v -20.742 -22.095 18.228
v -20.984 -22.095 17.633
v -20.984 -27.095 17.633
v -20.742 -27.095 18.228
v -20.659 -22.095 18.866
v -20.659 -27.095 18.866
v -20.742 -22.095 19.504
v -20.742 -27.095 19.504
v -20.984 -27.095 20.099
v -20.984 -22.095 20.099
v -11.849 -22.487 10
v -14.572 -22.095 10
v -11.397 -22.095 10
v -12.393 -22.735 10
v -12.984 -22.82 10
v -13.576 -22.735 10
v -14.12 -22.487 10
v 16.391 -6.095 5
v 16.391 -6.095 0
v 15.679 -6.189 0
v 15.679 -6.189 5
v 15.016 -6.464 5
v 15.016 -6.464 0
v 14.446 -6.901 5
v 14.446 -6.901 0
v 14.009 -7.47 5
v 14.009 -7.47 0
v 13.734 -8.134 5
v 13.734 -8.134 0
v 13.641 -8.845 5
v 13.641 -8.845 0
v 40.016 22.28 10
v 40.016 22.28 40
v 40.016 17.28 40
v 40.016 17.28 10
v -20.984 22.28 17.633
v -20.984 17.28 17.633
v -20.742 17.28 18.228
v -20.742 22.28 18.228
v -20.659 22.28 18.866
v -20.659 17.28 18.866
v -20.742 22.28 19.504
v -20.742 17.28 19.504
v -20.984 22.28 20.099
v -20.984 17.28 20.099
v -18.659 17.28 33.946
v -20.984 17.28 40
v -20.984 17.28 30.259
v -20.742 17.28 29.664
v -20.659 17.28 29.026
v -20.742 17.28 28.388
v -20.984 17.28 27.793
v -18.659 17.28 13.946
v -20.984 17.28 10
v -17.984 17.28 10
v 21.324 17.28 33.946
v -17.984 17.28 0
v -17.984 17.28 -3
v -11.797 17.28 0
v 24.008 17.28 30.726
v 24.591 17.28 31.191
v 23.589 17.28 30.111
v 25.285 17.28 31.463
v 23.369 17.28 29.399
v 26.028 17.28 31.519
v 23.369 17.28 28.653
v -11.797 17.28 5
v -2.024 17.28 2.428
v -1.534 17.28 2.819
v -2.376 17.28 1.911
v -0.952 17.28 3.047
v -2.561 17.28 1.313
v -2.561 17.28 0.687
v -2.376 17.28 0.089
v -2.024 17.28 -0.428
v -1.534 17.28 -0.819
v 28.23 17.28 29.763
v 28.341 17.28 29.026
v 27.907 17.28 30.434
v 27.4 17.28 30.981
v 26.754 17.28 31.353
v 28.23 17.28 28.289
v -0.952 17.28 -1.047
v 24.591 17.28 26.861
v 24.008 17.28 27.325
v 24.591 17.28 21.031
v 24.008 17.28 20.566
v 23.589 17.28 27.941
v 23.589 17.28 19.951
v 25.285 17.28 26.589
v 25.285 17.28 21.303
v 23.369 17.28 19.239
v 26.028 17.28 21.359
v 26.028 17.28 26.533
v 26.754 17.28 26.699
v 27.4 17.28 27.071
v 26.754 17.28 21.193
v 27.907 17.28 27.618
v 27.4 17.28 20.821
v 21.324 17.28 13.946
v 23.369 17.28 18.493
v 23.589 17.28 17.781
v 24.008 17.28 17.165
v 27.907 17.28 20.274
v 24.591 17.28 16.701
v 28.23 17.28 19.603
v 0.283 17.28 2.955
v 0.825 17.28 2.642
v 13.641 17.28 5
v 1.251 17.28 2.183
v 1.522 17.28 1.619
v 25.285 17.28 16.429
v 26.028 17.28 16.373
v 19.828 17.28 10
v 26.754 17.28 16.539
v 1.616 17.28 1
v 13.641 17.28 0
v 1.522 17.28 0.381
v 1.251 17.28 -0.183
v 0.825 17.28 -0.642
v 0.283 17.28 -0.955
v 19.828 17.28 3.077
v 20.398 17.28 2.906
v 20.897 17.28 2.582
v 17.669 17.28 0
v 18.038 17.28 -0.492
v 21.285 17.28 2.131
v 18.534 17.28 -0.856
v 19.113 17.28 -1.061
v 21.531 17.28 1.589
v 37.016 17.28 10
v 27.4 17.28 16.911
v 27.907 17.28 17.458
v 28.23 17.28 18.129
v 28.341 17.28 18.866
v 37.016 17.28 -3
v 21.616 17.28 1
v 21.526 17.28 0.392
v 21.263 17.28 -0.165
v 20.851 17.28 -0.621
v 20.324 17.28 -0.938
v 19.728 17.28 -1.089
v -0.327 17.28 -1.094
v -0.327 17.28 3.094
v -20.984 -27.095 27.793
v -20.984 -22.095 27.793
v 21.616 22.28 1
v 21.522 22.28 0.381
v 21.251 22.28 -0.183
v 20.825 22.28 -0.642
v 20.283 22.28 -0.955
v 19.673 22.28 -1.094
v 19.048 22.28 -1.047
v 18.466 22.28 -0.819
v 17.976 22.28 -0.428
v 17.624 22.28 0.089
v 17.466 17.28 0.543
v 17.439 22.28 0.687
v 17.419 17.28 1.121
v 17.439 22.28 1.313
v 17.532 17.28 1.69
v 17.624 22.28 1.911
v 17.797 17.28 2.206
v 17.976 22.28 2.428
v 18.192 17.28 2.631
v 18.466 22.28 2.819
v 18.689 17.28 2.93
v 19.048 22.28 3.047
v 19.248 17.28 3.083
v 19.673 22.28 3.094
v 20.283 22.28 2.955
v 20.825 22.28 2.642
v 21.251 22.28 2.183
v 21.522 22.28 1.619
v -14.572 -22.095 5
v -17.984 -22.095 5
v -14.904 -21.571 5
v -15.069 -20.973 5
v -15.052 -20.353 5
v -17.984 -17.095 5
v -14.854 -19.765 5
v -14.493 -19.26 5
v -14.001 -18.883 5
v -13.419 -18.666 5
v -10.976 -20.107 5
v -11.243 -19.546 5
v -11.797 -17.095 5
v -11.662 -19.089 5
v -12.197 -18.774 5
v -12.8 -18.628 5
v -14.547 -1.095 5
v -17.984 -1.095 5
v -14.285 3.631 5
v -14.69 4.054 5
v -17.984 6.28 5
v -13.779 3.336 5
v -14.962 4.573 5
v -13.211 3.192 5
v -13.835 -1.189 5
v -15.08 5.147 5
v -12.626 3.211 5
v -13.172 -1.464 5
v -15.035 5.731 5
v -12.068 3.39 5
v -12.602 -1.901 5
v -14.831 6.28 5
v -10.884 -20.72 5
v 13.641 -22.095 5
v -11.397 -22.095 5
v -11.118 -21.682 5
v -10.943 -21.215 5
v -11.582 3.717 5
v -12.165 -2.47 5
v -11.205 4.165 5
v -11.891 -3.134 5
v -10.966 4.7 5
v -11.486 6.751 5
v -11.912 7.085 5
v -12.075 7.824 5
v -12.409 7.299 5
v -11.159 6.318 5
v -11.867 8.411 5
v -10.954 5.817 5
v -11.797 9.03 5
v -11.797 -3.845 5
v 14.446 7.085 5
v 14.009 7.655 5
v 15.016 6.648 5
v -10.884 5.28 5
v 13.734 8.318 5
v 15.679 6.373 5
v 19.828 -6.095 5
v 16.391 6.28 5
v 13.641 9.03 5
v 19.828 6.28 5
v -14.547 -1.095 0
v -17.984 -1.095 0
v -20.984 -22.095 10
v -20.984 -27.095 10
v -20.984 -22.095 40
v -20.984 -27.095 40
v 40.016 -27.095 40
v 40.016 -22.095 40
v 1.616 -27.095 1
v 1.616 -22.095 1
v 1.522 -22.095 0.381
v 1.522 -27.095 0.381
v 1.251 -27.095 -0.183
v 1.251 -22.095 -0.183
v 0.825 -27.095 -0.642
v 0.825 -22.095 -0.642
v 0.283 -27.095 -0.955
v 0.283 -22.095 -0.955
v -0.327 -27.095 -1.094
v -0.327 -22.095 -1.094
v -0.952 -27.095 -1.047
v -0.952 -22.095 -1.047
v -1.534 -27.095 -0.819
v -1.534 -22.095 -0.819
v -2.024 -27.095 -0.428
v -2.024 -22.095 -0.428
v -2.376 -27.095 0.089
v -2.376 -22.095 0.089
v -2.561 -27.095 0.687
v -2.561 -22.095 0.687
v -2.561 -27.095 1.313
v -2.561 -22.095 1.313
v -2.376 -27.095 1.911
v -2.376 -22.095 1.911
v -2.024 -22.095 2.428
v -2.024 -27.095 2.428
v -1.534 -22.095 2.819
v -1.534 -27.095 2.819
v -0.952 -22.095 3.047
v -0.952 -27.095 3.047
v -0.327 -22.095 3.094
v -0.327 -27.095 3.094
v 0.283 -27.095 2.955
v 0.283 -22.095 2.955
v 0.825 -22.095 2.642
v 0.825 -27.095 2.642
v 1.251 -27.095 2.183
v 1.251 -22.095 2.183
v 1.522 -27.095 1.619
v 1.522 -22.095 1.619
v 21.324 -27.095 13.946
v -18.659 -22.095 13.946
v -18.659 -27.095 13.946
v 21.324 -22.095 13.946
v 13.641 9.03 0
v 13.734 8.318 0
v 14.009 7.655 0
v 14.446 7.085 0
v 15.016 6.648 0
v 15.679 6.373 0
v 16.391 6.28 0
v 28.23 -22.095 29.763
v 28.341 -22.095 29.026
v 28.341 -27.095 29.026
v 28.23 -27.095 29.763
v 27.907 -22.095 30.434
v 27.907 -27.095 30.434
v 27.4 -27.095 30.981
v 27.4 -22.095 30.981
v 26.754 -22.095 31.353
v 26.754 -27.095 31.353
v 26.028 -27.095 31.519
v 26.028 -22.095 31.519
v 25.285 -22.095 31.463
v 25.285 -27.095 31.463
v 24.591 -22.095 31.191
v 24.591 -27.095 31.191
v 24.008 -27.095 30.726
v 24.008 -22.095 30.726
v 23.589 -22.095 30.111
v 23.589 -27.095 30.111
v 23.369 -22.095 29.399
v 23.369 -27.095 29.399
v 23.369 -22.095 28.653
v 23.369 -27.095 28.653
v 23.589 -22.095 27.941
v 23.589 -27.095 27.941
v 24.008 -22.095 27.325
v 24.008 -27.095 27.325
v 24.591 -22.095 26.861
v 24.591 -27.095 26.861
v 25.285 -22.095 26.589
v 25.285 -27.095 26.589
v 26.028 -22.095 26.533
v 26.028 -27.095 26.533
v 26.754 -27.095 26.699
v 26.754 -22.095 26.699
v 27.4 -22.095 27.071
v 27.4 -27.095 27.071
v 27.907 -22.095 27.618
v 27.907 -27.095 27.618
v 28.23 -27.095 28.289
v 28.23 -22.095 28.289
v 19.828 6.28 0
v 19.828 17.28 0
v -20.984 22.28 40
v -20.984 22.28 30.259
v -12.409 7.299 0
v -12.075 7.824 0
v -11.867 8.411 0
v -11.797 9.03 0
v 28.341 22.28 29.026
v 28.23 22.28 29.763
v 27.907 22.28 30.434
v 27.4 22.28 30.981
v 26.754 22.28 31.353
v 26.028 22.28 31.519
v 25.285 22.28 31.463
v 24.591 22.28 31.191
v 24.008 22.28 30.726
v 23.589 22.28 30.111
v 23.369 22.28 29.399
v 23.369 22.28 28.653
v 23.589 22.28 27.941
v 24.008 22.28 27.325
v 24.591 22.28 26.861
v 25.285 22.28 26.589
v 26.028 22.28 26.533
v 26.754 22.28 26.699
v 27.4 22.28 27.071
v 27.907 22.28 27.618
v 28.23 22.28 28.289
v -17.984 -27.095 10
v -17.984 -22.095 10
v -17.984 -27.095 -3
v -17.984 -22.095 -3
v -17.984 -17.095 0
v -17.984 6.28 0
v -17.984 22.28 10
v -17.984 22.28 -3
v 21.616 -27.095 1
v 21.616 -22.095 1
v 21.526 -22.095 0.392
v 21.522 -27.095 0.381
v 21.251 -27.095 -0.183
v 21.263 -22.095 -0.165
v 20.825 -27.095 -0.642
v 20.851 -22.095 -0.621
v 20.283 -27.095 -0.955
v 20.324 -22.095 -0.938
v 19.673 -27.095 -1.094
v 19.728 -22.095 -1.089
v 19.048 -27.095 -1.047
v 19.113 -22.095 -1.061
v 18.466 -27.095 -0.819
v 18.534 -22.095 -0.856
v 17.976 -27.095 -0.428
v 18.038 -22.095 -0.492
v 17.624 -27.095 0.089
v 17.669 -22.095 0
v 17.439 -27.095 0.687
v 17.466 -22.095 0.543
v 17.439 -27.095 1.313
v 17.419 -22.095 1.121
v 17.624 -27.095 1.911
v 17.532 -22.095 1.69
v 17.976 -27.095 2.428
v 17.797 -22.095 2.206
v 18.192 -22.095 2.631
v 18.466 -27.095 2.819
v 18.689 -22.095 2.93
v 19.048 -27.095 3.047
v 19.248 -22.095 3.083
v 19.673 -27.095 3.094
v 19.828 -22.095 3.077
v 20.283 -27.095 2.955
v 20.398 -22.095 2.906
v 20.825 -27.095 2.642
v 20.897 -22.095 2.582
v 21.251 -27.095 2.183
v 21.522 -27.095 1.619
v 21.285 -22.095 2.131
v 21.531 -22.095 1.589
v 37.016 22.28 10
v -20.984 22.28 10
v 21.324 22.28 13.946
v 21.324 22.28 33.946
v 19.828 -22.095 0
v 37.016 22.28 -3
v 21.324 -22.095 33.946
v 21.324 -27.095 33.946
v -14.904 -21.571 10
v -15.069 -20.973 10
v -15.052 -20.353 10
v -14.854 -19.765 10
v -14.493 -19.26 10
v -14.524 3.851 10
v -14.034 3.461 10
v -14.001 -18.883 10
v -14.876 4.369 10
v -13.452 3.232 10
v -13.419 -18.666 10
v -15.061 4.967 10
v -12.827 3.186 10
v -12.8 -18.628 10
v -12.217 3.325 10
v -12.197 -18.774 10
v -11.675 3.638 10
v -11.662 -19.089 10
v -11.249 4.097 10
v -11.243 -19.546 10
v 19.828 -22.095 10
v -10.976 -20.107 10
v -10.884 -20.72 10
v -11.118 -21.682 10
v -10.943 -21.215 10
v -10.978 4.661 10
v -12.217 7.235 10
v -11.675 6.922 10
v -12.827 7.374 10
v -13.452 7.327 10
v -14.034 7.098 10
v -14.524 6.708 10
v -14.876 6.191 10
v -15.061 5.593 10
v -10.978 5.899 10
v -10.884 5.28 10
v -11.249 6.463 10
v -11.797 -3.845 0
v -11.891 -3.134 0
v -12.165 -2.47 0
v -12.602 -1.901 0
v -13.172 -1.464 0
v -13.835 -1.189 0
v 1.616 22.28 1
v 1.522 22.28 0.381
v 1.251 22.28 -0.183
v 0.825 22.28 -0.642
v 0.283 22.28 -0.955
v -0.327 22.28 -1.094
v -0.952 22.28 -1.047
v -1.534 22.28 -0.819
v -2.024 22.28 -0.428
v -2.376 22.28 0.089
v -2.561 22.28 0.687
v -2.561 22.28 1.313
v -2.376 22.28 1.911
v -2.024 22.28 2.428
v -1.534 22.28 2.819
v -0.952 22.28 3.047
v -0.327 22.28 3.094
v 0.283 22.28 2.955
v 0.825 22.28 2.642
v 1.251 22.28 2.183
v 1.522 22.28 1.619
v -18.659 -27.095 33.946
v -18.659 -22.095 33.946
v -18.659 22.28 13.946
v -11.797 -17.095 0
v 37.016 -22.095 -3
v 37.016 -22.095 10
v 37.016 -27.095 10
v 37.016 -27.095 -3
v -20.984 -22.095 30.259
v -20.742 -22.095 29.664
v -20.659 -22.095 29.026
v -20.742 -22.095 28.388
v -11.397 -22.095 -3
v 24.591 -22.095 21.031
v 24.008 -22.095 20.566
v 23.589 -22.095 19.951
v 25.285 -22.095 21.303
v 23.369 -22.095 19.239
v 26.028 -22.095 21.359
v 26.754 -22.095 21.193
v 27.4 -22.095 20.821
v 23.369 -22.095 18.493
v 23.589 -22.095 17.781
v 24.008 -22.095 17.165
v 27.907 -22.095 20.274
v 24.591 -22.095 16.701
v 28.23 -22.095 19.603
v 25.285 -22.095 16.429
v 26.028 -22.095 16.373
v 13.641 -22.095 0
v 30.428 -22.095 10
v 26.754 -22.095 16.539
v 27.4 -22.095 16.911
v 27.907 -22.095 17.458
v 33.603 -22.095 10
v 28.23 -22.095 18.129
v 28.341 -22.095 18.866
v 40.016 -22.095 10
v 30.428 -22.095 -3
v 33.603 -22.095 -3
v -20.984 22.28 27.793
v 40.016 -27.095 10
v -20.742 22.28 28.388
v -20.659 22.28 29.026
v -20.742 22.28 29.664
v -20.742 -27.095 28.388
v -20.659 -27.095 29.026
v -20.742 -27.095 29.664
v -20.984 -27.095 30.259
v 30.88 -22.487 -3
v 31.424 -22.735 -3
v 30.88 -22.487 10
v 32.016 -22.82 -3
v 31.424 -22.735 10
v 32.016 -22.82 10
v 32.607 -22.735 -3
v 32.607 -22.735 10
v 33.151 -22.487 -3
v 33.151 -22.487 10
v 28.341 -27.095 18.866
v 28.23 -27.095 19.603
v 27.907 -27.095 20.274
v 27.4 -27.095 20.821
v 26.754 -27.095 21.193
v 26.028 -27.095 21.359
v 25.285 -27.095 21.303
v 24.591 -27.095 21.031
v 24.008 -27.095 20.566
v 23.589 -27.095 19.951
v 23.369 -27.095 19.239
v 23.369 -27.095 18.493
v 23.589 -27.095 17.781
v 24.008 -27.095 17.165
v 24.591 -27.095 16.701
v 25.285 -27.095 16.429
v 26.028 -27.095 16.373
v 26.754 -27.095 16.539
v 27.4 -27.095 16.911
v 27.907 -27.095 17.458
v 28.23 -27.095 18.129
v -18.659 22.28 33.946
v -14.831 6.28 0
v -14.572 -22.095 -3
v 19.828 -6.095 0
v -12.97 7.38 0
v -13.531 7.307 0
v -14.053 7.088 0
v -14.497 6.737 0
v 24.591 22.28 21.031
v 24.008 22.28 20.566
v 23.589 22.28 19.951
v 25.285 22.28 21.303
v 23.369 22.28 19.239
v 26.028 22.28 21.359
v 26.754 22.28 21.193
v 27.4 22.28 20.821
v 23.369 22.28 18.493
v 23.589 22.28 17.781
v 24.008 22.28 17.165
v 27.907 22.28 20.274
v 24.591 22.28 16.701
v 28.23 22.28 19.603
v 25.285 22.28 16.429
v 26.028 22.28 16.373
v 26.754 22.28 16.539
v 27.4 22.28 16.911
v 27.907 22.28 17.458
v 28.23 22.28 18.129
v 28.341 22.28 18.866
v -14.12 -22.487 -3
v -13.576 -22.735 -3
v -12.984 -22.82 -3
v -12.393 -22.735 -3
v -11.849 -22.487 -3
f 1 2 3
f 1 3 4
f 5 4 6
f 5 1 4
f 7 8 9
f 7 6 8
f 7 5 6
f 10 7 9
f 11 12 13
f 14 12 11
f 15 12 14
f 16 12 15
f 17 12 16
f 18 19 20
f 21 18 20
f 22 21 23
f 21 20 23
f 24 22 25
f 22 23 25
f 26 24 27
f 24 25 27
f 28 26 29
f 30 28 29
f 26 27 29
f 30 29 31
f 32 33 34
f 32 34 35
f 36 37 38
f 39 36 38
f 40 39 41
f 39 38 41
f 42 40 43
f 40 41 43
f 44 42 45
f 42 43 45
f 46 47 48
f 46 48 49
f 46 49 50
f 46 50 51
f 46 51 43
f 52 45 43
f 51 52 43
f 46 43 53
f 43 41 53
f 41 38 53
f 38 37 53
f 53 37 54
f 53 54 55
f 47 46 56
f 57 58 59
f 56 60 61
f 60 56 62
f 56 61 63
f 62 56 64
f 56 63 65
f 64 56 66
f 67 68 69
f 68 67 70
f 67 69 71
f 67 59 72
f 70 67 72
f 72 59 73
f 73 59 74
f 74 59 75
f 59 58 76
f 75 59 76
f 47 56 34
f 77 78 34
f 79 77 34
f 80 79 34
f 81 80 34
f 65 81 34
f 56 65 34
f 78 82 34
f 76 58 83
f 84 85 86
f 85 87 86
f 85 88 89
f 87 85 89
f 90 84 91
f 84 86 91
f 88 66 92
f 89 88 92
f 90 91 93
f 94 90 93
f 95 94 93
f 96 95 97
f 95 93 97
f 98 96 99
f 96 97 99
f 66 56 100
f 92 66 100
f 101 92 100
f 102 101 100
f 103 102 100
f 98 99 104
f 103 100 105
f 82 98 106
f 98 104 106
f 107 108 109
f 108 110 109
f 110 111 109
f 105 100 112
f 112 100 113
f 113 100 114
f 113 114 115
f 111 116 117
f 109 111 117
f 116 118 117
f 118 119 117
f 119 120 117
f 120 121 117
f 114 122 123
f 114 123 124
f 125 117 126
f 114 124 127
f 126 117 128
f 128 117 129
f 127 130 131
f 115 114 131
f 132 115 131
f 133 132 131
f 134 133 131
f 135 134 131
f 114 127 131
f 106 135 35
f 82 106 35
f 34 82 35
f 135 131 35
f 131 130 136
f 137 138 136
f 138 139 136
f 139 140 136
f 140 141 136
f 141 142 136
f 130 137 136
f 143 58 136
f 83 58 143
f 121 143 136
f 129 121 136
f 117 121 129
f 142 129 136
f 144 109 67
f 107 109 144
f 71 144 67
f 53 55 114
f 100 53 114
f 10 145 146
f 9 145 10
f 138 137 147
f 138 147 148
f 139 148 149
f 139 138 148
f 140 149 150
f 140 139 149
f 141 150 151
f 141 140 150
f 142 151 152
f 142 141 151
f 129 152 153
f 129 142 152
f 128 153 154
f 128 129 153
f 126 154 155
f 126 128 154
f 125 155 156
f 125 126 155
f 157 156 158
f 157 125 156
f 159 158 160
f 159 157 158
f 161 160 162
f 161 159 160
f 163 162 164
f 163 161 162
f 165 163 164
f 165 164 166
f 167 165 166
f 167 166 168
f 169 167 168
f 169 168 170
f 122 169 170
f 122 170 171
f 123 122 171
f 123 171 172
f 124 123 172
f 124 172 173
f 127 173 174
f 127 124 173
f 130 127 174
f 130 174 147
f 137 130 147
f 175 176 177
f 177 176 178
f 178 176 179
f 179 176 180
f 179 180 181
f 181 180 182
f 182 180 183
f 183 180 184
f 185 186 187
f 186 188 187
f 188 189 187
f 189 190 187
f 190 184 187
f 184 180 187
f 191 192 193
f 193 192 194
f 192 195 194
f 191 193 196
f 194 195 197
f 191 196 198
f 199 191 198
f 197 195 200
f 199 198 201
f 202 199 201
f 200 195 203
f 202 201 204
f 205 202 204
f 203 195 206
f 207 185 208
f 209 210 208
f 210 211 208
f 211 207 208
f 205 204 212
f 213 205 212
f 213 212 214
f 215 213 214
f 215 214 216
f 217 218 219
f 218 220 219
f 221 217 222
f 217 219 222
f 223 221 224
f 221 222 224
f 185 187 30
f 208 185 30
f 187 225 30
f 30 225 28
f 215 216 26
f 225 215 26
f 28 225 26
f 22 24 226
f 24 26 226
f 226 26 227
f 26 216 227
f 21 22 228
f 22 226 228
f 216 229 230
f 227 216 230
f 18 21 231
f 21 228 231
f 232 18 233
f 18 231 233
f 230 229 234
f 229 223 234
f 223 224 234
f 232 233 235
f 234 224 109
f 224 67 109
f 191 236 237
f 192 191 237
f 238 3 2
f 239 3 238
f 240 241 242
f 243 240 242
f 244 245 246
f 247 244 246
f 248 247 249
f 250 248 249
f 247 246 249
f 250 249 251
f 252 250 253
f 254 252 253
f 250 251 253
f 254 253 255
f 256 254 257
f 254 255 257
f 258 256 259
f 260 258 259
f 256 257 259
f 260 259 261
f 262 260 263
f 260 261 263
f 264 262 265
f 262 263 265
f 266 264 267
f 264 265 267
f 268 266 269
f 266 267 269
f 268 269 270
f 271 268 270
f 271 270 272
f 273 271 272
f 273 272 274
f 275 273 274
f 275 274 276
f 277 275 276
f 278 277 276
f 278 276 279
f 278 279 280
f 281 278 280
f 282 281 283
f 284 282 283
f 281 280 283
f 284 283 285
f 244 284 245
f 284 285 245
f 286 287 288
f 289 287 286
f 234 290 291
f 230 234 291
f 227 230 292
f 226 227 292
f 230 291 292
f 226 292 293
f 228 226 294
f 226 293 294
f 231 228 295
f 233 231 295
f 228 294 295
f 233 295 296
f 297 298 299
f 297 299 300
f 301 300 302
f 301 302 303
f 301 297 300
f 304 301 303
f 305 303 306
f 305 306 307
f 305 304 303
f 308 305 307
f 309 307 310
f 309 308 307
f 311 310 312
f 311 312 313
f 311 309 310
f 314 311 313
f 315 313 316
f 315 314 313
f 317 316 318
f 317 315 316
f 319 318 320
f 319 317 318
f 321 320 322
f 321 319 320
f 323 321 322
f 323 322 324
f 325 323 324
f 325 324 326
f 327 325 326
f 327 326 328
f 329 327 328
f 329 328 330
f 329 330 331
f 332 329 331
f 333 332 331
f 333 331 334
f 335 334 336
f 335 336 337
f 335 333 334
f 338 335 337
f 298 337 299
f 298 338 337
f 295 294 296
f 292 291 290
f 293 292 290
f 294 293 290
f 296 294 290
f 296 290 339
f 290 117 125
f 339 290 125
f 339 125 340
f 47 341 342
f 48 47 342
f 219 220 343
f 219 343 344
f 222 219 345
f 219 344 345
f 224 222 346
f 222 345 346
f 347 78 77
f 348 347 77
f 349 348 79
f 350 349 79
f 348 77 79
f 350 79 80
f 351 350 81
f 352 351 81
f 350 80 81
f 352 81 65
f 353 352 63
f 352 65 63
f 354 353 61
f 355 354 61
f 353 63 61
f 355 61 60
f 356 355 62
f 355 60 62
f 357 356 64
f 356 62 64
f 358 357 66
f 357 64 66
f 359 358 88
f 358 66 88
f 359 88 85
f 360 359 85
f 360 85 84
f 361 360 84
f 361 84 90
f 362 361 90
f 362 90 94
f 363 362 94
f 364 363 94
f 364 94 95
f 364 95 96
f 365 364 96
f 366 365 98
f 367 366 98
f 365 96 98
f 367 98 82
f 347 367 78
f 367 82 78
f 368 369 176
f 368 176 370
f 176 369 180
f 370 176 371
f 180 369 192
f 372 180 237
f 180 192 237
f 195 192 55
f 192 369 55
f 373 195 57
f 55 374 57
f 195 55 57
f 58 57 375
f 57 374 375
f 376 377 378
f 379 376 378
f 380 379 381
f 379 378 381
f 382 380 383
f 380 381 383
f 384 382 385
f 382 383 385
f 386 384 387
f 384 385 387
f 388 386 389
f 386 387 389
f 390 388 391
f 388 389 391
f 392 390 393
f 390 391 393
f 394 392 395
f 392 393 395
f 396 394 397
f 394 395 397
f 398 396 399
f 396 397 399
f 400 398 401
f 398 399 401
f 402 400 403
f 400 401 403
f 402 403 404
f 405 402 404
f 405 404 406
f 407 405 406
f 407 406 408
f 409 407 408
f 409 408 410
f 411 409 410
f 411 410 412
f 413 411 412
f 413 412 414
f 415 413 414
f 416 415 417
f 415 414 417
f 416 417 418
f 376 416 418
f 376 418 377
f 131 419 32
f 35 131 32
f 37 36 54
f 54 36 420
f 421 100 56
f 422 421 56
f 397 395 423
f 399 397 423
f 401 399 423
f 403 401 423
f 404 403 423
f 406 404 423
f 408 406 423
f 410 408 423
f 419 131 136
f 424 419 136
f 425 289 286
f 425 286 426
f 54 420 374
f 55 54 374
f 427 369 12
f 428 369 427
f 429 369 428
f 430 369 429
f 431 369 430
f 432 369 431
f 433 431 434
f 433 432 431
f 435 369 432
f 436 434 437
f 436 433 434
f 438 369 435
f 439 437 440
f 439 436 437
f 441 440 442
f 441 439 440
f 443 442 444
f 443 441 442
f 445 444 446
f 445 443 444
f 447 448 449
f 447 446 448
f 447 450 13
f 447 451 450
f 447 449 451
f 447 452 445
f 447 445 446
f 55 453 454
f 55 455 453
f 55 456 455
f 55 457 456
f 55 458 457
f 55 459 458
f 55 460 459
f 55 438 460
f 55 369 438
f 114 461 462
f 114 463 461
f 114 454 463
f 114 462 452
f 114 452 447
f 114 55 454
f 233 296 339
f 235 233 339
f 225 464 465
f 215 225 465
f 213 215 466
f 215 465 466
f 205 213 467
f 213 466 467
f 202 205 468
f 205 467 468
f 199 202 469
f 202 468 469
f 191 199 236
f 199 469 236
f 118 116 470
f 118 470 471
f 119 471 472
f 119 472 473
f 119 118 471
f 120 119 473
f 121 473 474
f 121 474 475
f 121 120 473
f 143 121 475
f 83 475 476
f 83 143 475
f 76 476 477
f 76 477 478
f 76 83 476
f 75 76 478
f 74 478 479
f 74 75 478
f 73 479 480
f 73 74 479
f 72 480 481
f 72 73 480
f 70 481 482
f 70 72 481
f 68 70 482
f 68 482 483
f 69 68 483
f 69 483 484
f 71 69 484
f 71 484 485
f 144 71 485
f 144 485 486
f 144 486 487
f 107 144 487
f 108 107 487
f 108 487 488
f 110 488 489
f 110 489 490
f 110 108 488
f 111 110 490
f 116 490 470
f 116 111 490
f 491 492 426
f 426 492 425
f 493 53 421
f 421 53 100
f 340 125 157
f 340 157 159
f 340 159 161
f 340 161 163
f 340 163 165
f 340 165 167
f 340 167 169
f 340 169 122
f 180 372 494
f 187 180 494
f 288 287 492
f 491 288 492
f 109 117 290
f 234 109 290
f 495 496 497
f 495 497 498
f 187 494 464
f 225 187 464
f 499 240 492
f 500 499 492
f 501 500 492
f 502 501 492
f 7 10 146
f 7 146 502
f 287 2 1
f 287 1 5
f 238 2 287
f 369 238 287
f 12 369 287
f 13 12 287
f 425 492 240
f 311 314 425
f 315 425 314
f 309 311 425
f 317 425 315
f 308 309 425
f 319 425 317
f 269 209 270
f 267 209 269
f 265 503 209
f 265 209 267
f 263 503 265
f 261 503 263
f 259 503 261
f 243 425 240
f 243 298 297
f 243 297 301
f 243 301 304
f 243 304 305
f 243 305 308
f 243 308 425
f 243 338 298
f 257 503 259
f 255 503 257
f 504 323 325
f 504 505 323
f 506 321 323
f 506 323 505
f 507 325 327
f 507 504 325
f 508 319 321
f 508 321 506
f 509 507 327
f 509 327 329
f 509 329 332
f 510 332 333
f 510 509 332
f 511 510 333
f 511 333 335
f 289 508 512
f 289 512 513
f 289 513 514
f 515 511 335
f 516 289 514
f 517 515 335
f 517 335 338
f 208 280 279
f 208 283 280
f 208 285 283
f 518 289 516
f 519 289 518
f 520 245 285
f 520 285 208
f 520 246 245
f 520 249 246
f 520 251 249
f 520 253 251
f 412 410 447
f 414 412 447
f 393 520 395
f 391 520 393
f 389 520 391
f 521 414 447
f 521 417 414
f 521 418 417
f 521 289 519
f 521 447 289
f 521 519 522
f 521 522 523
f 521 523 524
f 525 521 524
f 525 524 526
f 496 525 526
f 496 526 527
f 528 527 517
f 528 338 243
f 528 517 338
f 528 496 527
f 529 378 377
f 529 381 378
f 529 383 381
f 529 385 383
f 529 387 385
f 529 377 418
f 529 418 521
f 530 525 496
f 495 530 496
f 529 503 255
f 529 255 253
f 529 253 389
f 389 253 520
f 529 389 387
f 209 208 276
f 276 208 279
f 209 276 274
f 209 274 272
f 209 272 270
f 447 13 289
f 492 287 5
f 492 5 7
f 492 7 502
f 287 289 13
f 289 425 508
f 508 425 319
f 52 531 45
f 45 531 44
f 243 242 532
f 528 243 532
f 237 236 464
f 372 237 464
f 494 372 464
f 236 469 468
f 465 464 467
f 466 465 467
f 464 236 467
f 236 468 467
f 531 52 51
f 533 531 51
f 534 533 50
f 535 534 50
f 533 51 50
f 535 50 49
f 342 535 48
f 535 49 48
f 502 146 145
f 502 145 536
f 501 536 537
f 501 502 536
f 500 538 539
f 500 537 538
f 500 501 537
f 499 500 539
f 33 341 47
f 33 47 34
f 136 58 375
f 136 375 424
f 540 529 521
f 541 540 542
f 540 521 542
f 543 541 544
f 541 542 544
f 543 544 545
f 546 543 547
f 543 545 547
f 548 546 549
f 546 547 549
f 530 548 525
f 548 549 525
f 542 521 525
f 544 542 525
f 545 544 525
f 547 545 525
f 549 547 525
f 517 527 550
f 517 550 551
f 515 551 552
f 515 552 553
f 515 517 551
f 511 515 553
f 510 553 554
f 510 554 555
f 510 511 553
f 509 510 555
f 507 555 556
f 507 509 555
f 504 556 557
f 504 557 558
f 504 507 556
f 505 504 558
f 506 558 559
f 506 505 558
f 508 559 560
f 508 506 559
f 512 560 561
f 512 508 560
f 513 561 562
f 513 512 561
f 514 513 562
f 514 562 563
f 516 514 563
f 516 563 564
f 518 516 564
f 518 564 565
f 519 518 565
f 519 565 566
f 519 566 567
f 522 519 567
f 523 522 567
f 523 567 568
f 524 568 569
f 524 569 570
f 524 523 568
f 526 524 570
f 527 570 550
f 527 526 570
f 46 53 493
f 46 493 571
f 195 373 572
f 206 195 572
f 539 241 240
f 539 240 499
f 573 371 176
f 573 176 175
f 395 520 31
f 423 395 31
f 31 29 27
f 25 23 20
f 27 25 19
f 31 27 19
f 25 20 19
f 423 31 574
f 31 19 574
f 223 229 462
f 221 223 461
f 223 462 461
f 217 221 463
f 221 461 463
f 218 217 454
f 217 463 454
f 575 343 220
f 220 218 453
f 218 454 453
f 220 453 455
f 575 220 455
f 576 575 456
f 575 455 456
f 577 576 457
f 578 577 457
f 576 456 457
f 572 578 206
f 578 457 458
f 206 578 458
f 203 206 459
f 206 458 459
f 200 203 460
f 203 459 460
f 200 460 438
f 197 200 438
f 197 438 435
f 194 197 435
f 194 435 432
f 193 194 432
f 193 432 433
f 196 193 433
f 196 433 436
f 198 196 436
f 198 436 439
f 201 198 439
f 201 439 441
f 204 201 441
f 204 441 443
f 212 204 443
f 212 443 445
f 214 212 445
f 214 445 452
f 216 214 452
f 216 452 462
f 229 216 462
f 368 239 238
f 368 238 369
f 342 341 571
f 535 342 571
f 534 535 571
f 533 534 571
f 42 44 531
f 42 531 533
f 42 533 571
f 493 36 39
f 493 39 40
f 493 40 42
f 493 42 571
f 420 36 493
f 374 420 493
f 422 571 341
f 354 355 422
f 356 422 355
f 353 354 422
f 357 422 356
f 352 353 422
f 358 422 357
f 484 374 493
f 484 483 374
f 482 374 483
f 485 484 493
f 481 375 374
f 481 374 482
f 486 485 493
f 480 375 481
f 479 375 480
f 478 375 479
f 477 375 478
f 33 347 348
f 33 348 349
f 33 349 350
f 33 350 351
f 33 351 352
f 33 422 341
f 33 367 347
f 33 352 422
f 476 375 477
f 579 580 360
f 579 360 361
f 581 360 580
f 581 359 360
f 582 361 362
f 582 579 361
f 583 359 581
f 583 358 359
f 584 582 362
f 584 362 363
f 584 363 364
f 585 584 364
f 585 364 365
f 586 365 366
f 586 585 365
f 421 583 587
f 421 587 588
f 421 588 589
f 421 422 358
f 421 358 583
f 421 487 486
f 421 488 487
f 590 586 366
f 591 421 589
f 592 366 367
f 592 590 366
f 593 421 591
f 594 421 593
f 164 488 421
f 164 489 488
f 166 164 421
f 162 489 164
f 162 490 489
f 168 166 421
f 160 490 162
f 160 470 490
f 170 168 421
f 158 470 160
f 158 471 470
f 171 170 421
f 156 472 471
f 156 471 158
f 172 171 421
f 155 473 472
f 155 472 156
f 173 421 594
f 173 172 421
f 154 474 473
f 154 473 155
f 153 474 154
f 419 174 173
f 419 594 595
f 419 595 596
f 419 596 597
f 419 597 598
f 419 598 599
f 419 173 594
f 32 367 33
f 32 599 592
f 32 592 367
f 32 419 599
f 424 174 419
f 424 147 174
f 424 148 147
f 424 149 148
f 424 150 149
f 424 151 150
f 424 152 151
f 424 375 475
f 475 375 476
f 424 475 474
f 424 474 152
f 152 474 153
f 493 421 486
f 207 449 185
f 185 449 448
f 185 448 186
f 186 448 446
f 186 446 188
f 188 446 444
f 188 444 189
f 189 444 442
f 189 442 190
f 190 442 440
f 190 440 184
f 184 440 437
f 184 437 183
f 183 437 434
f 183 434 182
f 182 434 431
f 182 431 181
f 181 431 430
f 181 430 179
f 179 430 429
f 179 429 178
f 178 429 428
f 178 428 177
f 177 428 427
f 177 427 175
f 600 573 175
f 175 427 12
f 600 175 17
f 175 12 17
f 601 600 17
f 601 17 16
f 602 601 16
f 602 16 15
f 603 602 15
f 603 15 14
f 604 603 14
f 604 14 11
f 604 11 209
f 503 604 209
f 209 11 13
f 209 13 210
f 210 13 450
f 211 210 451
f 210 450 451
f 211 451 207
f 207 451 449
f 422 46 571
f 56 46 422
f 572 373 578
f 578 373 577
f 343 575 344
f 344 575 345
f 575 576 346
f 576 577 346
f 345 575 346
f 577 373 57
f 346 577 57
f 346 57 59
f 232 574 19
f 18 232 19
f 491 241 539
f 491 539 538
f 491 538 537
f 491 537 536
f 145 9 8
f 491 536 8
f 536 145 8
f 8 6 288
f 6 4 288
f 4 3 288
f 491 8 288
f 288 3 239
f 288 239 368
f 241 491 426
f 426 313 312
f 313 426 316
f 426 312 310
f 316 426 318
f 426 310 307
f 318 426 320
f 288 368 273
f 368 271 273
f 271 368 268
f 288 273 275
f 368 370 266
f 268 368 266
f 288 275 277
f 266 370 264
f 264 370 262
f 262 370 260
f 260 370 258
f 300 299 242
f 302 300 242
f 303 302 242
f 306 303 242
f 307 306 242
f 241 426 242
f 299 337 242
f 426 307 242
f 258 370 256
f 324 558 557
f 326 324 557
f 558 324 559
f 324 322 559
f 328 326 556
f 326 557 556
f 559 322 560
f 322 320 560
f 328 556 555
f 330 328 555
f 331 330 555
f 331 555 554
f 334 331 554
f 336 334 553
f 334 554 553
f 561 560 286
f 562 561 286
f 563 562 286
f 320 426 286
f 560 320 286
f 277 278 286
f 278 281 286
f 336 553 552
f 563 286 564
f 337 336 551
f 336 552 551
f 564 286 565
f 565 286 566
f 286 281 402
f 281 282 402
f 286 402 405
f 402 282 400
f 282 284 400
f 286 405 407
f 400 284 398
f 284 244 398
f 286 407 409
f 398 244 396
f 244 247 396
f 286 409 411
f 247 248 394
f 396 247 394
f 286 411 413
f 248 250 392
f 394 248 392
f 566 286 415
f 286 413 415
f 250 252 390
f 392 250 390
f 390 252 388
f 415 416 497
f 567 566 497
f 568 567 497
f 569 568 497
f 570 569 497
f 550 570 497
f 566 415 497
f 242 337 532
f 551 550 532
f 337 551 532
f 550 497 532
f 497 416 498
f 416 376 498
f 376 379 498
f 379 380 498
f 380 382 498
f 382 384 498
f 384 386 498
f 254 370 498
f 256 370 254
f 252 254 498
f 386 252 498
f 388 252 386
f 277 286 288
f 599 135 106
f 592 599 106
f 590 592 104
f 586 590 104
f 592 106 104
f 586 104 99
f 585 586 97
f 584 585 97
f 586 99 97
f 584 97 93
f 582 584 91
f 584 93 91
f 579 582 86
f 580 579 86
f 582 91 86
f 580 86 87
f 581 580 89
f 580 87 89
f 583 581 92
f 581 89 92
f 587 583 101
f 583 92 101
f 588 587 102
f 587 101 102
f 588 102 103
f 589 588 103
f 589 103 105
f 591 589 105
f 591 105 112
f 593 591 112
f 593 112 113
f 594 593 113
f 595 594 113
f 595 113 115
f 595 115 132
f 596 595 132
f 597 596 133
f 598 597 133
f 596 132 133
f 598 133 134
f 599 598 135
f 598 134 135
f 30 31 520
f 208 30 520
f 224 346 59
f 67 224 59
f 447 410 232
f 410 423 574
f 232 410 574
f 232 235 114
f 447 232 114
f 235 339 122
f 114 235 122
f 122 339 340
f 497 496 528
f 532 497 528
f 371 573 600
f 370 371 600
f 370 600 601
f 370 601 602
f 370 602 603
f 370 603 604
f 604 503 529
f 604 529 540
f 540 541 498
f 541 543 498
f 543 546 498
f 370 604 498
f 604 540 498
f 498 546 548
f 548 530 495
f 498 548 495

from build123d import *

# Parameters (mm, degrees)
BOSS_EXTRUDE1_DEPTH   = 5
BOSS_EXTRUDE1_2_DEPTH = 5
BOSS_EXTRUDE1_3_DEPTH = 5
BOSS_EXTRUDE1_4_DEPTH = 5
SKETCH2_W             = 37.8125
SKETCH2_H             = 39.375
BOSS_EXTRUDE2_DEPTH   = 5
SKETCH3_W             = 55
SKETCH3_H             = 13
SKETCH3_R             = 2.1
BOSS_EXTRUDE3_DEPTH   = 5
SKETCH4_W             = 61
SKETCH4_H             = 30
BOSS_EXTRUDE4_DEPTH   = 5
SKETCH5_R             = 2.5
SKETCH5_W             = 39.983210939
SKETCH5_H             = 20
CUT_EXTRUDE3_DEPTH    = 5
SKETCH7_R             = 2.1
CUT_EXTRUDE4_DEPTH    = 14


with BuildPart() as part:
    # Sketch1 → Boss-Extrude1 (new body)
    with BuildSketch(Plane.XY):
        with BuildLine():
            Line((16.390676557, 6.279692656), (19.828176557, 6.279692656))
            Line((19.828176557, 6.279692656), (19.828176557, 17.279692656))
            Line((19.828176557, 17.279692656), (13.640676557, 17.279692656))
            Line((13.640676557, 17.279692656), (13.640676557, 9.029692656))
            ThreePointArc((13.640676557, 9.029692656), (14.446132909, 7.085149007), (16.390676557, 6.279692656))
        make_face()
    extrude(amount=BOSS_EXTRUDE1_DEPTH)



with BuildPart() as body_2:
    # Sketch1 → Boss-Extrude1 2 (new body)
    with BuildSketch(Plane.XY):
        with BuildLine():
            Line((-17.984323443, 6.279692656), (-14.546823443, 6.279692656))
            ThreePointArc((-14.546823443, 6.279692656), (-12.602279794, 7.085149007), (-11.796823443, 9.029692656))
            Line((-11.796823443, 9.029692656), (-11.796823443, 17.279692656))
            Line((-11.796823443, 17.279692656), (-17.984323443, 17.279692656))
            Line((-17.984323443, 17.279692656), (-17.984323443, 6.279692656))
        make_face()
    extrude(amount=BOSS_EXTRUDE1_2_DEPTH)


with BuildPart() as body_3:
    # Sketch1 → Boss-Extrude1 3 (new body)
    with BuildSketch(Plane.XY):
        with BuildLine():
            Line((19.828176557, -6.095307344), (16.390676557, -6.095307344))
            ThreePointArc((16.390676557, -6.095307344), (14.446132909, -6.900763696), (13.640676557, -8.845307344))
            Line((13.640676557, -8.845307344), (13.640676557, -22.095307344))
            Line((13.640676557, -22.095307344), (19.828176557, -22.095307344))
            Line((19.828176557, -22.095307344), (19.828176557, -6.095307344))
        make_face()
    extrude(amount=BOSS_EXTRUDE1_3_DEPTH)


with BuildPart() as body_4:
    # Sketch1 → Boss-Extrude1 4 (new body)
    with BuildSketch(Plane.XY):
        with BuildLine():
            Line((-11.796823443, -17.095307344), (-11.796823443, -3.845307344))
            ThreePointArc((-11.796823443, -3.845307344), (-12.602279794, -1.900763696), (-14.546823443, -1.095307344))
            Line((-14.546823443, -1.095307344), (-17.984323443, -1.095307344))
            Line((-17.984323443, -1.095307344), (-17.984323443, -17.095307344))
            Line((-17.984323443, -17.095307344), (-11.796823443, -17.095307344))
        make_face()
    extrude(amount=BOSS_EXTRUDE1_4_DEPTH)


with BuildPart() as part_1:
    add(part.part)

    add(body_2.part)  # Boss-Extrude2 merges body 2

    add(body_3.part)  # Boss-Extrude2 merges body 3

    add(body_4.part)  # Boss-Extrude2 merges body 4
    # Sketch2 → Boss-Extrude2 (add)
    with BuildSketch(Plane.XY.offset(5)):
        with Locations((0.921926557, -2.407807344)):
            Rectangle(SKETCH2_W, SKETCH2_H)
    extrude(amount=BOSS_EXTRUDE2_DEPTH)

    # Sketch3 → Boss-Extrude3 (add)
    with BuildSketch(Plane(origin=(0, 17.279692656, 0), x_dir=(1, 0, 0), z_dir=(0, 1, 0))):
        with Locations((9.515676557, -3.5)):
            Rectangle(SKETCH3_W, SKETCH3_H)
        with Locations((-0.484323443, -1)):
            Circle(SKETCH3_R, mode=Mode.SUBTRACT)
        with Locations((19.515676557, -1)):
            Circle(SKETCH3_R, mode=Mode.SUBTRACT)
    boss_extrude3 = extrude(amount=BOSS_EXTRUDE3_DEPTH)

    # Mirror1: Boss-Extrude3 across plane
    add(boss_extrude3.mirror(Plane(origin=(0, -2.407807344, 0), x_dir=(0, 0, 1), z_dir=(0, -1, 0))))

    # Sketch4 → Boss-Extrude4 (add)
    with BuildSketch(Plane(origin=(0, 22.279692656, 0), x_dir=(1, 0, 0), z_dir=(0, 1, 0))):
        with Locations((9.515676557, -25)):
            Rectangle(SKETCH4_W, SKETCH4_H)
    boss_extrude4 = extrude(amount=-BOSS_EXTRUDE4_DEPTH)

    # Mirror2: Boss-Extrude4 across plane
    add(boss_extrude4.mirror(Plane(origin=(0, -2.407807344, 0), x_dir=(0, 0, 1), z_dir=(0, -1, 0))))

    # Sketch5 → Cut-Extrude3 (cut)
    with BuildSketch(Plane.XZ.offset(-17.279692656)):
        with Locations((-23.159015917, 29.025922811)):
            Circle(SKETCH5_R)
        with Locations((-23.159015917, 18.865922811)):
            Circle(SKETCH5_R)
        with Locations((25.840984083, 29.025922811)):
            Circle(SKETCH5_R)
        with Locations((25.840984083, 18.865922811)):
            Circle(SKETCH5_R)
        with Locations((1.332589552, 23.945922811)):
            Rectangle(SKETCH5_W, SKETCH5_H)
    cut_extrude3 = extrude(amount=-CUT_EXTRUDE3_DEPTH, mode=Mode.SUBTRACT)

    # Sketch7 → Cut-Extrude4 (cut, through all)
    with BuildSketch(Plane.XY.offset(10)):
        with Locations((32.015676557, -20.720307344)):
            Circle(SKETCH7_R)
        with Locations((-12.984323443, -20.720307344)):
            Circle(SKETCH7_R)
        with Locations((32.015676557, 5.279692656)):
            Circle(SKETCH7_R)
        with Locations((-12.984323443, 5.279692656)):
            Circle(SKETCH7_R)
    extrude(amount=-CUT_EXTRUDE4_DEPTH, mode=Mode.SUBTRACT)

    # Mirror3: Cut-Extrude3 across plane
    add(cut_extrude3.mirror(Plane(origin=(0, -2.407807344, 0), x_dir=(0, 0, 1), z_dir=(0, -1, 0))), mode=Mode.SUBTRACT)


solid = part_1.part
